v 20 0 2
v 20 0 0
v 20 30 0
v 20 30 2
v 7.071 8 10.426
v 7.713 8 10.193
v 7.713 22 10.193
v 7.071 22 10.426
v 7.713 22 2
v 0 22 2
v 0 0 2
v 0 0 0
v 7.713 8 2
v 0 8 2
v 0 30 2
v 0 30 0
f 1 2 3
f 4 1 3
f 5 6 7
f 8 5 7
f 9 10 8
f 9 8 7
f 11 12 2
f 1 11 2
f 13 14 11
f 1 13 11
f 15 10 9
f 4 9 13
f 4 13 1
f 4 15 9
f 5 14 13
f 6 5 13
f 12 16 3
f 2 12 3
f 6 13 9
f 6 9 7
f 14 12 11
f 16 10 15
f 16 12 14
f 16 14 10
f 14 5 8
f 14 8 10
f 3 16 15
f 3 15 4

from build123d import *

# Parameters (mm, degrees)
F0_W     = 20
F0_H     = 30
F1_DEPTH = 2
F3_START = -8
F3_DEPTH = 14
F4_SIZE  = 1


with BuildPart() as f1:
    # F0 (on Top) → F1 (new body)
    with BuildSketch(Plane.XY):
        with Locations((10, 15)):
            Rectangle(F0_W, F0_H)
    extrude(amount=F1_DEPTH)

    # F2 (on face) → F3 (join)
    with BuildSketch(Plane.XZ.offset(F3_START)):
        Polygon((7.7134513162, 11.1925333174), (0, 2), (7.7134513162, 2), align=None)
    extrude(amount=-F3_DEPTH)

    # F4
    f4_edges = [f1.edges().sort_by_distance(p)[0] for p in [
        (7.713451, 15, 11.192533),
    ]]
    chamfer(f4_edges, length=F4_SIZE)


solid = f1.part
